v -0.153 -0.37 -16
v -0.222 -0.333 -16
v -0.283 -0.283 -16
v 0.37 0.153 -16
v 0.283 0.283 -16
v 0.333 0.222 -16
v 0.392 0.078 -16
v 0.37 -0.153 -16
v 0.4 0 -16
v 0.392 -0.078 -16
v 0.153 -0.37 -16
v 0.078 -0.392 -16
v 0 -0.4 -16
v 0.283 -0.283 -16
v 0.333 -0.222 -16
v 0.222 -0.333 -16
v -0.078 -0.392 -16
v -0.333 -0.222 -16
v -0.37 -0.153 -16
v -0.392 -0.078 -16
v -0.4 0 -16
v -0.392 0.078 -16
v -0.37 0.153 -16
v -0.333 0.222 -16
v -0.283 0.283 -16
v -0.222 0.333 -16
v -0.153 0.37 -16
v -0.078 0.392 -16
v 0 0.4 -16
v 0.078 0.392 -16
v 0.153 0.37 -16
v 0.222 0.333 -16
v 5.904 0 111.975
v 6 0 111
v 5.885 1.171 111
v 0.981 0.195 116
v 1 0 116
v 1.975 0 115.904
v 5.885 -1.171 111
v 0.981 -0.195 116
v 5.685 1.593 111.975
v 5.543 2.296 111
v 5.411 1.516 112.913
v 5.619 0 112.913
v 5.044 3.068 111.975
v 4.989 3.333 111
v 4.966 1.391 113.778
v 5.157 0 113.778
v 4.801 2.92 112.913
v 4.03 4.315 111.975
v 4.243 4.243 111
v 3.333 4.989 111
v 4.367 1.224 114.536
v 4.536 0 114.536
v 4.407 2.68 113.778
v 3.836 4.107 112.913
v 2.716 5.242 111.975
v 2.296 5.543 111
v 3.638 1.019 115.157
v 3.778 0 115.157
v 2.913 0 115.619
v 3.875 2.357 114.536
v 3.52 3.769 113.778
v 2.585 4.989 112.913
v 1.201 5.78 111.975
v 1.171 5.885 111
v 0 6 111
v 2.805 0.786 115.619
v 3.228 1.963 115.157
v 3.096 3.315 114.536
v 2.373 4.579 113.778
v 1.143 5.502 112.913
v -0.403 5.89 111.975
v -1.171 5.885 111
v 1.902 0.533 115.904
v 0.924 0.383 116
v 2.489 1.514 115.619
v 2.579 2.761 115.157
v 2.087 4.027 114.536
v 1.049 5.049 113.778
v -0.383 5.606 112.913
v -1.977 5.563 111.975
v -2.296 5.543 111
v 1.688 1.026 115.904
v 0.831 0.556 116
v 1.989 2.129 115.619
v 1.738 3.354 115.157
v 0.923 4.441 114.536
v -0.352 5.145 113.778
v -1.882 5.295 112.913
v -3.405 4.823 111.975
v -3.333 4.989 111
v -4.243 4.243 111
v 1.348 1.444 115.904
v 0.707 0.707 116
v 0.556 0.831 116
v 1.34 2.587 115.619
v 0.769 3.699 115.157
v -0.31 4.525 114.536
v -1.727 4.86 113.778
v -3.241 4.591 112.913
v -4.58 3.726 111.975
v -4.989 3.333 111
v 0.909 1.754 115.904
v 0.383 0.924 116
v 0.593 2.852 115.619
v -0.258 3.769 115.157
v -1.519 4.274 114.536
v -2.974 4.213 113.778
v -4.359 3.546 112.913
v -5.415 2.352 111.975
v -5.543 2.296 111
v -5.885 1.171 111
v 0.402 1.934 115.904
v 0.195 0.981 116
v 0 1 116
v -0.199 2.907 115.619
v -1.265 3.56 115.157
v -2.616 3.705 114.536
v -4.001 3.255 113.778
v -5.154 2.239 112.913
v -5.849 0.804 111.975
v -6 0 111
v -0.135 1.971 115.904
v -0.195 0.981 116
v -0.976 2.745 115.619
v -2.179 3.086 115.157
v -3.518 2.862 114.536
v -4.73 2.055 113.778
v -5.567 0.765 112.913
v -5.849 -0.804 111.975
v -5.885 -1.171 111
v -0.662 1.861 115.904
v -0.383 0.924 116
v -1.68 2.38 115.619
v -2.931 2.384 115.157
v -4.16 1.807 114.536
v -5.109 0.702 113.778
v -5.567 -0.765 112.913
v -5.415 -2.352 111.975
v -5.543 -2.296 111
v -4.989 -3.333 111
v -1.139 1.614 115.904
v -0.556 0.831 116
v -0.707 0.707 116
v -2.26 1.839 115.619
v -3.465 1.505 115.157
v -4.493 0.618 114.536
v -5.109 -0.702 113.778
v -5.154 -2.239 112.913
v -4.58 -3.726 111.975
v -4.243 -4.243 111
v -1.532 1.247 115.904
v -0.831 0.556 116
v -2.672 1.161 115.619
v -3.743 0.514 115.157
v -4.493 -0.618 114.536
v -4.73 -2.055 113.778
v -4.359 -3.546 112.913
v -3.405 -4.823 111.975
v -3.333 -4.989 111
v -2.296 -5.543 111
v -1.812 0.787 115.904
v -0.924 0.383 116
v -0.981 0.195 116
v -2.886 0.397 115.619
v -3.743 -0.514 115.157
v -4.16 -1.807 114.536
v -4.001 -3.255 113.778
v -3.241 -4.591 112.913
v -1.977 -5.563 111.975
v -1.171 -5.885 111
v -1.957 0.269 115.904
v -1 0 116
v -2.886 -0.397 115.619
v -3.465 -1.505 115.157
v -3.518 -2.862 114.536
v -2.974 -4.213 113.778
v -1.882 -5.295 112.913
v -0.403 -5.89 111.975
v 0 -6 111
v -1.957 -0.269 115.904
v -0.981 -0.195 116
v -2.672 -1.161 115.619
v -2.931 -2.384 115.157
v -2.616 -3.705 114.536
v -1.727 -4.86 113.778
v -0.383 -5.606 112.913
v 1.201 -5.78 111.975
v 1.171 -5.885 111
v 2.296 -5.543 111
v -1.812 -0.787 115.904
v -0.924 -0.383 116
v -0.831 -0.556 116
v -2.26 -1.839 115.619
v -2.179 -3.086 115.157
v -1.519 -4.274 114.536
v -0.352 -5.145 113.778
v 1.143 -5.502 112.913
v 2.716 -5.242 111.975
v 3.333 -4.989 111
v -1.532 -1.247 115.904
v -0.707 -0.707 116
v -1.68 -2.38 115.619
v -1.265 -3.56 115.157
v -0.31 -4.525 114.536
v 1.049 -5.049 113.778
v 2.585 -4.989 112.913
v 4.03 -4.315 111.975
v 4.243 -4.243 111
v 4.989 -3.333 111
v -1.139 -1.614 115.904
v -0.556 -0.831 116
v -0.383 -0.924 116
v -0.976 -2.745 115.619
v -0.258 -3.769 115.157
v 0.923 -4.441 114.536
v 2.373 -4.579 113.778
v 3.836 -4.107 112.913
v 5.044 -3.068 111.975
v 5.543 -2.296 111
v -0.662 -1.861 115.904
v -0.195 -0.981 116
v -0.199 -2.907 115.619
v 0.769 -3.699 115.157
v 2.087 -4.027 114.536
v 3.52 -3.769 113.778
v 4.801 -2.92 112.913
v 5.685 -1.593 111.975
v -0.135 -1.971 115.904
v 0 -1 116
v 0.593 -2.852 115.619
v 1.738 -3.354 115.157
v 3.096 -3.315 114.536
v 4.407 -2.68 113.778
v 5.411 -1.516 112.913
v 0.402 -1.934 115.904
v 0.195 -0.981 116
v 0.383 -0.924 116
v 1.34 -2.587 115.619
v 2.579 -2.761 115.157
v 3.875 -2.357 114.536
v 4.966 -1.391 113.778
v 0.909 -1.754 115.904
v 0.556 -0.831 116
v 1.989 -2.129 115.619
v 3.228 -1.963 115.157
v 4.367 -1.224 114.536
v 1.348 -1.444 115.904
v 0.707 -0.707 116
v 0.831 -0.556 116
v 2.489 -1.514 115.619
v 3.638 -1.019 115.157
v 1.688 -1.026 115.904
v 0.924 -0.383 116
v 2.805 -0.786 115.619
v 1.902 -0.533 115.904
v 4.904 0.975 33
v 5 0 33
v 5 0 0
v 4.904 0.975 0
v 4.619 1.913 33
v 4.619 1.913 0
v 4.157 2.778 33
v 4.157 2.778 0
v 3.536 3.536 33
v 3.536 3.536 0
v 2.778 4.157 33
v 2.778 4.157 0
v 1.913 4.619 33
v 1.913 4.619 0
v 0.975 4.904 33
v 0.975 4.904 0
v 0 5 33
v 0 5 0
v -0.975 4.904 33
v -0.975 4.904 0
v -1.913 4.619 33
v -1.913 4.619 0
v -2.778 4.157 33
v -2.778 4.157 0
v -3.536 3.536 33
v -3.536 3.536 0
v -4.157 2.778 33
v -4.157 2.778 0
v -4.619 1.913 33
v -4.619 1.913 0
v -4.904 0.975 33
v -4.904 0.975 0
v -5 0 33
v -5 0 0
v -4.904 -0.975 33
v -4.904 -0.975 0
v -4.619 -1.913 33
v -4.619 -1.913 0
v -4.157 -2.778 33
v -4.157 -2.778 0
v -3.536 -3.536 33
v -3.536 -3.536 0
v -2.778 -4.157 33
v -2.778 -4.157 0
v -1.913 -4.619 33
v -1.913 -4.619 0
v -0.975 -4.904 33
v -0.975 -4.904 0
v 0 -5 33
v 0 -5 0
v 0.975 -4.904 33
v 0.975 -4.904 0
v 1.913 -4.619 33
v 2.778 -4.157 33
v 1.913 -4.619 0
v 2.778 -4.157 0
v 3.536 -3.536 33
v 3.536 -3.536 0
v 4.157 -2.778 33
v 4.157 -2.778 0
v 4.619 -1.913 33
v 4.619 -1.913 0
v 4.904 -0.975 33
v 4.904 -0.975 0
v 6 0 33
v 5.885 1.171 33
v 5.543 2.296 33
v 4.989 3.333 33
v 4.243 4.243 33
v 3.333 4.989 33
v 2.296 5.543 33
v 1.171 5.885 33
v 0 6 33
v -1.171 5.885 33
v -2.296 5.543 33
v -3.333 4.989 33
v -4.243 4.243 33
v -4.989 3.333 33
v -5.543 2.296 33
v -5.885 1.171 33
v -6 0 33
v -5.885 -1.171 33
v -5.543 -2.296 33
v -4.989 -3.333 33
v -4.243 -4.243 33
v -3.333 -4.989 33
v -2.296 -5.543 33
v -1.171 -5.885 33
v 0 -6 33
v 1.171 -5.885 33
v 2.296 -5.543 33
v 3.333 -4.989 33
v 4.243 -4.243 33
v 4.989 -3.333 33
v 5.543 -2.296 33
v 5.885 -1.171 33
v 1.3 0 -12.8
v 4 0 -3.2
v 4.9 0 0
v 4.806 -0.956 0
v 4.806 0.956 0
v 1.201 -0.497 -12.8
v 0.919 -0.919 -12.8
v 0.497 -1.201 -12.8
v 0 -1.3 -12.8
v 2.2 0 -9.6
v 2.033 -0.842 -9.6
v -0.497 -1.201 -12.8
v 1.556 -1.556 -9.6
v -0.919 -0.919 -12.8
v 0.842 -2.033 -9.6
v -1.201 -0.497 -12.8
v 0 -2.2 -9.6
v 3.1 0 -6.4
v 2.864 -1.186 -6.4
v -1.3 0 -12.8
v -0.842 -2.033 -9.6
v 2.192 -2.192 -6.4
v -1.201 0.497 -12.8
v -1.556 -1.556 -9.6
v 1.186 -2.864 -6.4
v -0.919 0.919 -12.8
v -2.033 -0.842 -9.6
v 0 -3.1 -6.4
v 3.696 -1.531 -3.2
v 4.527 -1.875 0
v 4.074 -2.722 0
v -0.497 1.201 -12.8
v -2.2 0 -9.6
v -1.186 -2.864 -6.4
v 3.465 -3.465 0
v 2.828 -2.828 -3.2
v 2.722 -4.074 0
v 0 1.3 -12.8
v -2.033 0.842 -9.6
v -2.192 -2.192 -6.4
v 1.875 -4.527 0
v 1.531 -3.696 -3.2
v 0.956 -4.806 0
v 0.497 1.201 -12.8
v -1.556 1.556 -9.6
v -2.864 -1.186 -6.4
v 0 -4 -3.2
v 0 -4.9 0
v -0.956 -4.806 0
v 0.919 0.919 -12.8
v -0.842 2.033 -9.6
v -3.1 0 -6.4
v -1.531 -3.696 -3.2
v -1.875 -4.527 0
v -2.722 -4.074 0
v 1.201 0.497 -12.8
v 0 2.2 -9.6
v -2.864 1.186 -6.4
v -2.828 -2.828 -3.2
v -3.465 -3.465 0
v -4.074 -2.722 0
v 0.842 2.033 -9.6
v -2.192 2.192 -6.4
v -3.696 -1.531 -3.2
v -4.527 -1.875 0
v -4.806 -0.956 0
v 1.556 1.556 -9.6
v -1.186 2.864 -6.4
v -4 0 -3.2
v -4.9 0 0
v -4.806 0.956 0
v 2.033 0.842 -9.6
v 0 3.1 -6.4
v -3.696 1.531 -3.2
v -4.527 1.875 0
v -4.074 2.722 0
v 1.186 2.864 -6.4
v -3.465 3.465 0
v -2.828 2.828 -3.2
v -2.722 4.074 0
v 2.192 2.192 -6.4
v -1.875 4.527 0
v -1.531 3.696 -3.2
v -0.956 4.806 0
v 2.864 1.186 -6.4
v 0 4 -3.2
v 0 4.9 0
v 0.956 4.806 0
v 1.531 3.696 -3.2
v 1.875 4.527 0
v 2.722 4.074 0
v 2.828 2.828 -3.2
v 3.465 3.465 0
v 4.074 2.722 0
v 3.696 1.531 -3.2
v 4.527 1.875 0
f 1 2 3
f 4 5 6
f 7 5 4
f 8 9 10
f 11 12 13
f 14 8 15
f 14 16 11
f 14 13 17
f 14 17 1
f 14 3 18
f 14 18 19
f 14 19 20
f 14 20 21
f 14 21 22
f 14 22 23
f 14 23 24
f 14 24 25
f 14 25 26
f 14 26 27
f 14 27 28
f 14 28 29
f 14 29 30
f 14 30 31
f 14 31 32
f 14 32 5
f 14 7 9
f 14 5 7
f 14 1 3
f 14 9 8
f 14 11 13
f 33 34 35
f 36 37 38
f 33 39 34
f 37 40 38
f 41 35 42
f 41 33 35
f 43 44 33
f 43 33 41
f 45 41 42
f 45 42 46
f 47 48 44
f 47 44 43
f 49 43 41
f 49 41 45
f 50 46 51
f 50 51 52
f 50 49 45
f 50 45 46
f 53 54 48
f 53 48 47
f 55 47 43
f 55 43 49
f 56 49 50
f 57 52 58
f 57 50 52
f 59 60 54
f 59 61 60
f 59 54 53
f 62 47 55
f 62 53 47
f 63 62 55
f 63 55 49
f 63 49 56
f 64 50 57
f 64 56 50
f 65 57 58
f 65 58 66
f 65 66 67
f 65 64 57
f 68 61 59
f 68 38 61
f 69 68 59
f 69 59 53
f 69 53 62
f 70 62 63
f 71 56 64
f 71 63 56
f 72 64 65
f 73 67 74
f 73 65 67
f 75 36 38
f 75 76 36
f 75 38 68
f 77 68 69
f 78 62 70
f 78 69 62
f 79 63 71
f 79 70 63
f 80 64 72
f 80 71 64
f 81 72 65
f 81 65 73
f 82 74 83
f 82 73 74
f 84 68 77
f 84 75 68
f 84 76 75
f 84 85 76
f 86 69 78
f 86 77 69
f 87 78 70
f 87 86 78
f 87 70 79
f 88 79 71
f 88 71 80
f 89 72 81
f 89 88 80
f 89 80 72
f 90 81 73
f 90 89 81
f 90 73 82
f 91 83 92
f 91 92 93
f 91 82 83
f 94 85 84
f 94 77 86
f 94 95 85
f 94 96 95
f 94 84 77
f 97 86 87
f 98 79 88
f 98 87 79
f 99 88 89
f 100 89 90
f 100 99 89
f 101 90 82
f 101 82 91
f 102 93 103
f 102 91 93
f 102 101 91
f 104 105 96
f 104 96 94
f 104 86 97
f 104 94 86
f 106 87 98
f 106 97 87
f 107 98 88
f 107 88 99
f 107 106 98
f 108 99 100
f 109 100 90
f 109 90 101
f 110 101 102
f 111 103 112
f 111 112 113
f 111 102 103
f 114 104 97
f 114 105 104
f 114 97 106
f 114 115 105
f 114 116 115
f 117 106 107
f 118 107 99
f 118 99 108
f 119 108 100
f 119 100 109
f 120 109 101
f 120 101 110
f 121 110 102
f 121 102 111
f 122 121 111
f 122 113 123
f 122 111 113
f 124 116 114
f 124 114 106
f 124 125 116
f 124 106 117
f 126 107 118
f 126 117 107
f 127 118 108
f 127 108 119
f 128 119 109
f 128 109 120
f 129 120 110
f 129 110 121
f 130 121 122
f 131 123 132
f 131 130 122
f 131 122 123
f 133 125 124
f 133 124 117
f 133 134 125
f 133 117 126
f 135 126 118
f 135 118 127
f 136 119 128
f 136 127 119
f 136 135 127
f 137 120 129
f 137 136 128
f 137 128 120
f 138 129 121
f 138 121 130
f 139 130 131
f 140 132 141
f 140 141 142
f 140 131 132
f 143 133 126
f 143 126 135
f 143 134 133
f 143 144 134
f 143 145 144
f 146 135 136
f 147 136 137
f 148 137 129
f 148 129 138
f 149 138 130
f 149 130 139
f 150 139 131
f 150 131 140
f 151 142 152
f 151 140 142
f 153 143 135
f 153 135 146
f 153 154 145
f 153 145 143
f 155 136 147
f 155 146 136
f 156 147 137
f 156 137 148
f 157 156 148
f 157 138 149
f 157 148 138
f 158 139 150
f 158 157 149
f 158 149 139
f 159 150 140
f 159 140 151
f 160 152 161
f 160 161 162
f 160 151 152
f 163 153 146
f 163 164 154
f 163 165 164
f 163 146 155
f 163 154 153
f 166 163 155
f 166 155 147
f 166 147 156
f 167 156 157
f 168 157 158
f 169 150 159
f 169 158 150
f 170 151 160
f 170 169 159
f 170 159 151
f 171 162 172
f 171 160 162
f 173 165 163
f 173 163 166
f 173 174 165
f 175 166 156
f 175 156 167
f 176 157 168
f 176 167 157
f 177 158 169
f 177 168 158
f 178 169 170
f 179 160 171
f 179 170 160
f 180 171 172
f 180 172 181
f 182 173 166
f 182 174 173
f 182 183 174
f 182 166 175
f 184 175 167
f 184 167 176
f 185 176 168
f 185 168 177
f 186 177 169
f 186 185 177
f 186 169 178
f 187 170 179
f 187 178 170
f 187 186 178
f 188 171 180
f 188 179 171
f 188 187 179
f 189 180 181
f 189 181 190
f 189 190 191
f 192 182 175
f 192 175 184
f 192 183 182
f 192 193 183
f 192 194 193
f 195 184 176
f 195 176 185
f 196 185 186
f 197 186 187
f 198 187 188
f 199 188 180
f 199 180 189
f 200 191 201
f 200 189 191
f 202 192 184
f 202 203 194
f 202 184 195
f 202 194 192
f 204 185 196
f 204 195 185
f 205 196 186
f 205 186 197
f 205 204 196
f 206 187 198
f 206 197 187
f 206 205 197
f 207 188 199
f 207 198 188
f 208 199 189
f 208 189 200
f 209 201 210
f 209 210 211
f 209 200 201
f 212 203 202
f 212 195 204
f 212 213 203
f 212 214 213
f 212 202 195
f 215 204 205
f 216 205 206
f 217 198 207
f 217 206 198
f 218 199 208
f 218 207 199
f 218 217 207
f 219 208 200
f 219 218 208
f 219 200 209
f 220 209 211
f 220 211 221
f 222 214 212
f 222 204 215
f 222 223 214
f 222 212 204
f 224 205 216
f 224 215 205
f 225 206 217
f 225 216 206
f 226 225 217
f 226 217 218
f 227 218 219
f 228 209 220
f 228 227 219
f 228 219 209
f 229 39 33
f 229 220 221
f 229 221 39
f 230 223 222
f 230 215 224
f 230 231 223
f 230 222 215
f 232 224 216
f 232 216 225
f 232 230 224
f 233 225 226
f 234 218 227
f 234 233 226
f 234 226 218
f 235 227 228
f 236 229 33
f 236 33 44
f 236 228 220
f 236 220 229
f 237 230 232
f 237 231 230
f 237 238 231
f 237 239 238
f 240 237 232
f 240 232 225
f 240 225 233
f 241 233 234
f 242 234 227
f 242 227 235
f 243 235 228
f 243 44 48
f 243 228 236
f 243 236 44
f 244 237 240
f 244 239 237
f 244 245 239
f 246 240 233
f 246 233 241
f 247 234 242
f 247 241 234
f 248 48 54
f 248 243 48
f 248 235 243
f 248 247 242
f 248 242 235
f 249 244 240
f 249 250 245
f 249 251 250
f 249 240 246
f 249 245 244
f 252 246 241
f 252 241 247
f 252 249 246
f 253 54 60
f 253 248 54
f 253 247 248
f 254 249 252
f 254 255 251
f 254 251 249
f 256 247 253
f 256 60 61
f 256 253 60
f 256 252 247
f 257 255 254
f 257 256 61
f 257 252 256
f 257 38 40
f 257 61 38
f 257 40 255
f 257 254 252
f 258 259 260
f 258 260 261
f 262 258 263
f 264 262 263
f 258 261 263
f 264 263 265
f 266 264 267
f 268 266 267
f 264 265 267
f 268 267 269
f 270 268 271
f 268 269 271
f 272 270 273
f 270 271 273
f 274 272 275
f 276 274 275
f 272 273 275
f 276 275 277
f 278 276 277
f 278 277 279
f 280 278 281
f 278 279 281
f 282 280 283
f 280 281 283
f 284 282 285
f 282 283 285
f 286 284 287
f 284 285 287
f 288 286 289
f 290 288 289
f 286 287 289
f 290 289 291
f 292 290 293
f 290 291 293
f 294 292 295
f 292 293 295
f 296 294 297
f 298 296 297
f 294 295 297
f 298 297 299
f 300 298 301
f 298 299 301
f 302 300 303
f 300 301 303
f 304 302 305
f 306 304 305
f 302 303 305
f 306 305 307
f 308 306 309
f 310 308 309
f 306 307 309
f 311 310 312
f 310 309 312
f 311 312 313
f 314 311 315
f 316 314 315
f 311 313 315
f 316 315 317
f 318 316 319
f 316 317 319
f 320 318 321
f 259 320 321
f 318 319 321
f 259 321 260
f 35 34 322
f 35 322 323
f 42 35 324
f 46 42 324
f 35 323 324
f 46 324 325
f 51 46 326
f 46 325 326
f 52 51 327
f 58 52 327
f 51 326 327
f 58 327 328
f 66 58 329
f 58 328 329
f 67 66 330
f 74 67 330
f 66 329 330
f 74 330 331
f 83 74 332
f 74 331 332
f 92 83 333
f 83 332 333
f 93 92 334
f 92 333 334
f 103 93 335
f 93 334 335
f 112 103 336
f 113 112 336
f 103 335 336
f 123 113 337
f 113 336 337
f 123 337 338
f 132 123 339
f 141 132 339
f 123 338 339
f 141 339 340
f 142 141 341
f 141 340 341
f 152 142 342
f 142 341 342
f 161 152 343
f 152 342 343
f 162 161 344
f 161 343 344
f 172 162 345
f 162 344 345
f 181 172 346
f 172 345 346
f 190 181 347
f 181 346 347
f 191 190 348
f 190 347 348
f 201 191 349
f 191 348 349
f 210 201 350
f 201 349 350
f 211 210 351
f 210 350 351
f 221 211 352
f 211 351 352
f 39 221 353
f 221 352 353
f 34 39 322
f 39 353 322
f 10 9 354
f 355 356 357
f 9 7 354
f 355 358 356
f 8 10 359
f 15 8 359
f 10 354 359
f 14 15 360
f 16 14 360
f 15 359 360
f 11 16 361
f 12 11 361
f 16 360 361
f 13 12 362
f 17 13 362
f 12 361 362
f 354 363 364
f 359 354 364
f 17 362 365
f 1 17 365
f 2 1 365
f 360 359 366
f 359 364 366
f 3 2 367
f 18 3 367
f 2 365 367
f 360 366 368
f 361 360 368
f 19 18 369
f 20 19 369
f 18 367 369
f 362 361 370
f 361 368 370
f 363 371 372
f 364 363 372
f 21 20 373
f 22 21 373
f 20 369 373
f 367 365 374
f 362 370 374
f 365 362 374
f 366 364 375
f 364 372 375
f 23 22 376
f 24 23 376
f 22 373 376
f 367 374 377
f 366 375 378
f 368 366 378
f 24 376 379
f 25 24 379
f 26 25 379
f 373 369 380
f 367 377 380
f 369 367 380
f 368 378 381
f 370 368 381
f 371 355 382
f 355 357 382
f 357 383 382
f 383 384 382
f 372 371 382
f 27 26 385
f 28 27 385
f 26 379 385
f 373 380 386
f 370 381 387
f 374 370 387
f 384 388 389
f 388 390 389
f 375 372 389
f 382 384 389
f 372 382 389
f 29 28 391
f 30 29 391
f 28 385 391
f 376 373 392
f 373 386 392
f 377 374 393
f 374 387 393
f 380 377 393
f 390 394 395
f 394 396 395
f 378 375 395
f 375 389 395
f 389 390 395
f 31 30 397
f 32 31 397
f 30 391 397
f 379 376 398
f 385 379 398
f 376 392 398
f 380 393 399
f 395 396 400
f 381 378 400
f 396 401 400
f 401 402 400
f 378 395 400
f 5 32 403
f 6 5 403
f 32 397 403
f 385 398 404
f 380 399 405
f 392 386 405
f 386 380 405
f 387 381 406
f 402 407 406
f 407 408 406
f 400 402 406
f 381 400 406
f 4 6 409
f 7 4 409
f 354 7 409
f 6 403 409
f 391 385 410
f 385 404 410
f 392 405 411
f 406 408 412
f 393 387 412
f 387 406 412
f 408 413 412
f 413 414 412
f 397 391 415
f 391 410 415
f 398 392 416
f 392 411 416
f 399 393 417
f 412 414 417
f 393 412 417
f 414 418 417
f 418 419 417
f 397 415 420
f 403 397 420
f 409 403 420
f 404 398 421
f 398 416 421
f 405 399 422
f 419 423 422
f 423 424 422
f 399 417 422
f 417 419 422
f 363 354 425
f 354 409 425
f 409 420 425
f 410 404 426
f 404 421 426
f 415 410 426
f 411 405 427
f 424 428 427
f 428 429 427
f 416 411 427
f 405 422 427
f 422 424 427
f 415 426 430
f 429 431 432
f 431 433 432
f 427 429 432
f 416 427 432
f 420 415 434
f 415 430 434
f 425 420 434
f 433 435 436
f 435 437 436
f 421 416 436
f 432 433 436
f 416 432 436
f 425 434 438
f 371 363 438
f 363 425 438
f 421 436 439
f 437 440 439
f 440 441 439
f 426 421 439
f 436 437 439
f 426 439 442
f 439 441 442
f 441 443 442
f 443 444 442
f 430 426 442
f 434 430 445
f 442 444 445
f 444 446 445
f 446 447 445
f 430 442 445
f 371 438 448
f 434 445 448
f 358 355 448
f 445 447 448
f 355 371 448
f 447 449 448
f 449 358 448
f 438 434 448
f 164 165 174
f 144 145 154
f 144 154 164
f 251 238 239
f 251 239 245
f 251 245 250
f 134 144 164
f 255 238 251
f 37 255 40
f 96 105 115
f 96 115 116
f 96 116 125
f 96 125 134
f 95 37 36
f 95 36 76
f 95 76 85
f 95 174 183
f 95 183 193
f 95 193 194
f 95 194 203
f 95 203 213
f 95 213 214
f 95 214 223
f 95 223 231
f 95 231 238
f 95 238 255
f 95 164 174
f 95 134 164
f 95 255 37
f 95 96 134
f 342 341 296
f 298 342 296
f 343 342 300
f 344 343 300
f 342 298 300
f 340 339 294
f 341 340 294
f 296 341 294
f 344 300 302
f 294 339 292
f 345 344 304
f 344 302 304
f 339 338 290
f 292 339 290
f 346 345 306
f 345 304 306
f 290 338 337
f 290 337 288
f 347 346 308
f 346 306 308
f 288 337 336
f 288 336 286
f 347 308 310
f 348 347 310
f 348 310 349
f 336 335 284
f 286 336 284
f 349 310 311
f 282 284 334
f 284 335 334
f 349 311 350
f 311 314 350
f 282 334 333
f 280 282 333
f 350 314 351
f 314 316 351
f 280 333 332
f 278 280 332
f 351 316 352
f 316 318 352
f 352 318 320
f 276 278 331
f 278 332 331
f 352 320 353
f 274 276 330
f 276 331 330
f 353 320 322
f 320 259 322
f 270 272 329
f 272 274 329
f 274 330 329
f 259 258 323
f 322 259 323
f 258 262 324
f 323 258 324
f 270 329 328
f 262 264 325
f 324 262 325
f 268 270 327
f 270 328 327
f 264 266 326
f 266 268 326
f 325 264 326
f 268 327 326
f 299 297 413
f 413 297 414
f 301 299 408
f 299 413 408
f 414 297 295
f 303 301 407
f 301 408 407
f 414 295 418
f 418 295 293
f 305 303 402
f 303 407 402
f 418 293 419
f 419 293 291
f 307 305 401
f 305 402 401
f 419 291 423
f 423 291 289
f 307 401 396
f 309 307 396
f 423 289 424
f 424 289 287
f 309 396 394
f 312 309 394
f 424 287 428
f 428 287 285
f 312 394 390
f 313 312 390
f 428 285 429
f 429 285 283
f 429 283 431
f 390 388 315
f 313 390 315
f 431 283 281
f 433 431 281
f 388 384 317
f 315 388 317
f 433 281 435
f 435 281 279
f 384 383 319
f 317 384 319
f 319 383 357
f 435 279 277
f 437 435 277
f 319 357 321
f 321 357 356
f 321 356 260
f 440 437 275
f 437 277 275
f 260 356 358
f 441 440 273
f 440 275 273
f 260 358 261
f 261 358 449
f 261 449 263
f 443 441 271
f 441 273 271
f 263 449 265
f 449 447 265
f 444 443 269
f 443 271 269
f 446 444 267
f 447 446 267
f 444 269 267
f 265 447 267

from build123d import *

# Parameters (mm, degrees)
F0_R     = 5
F1_DEPTH = 33
F2_R     = 4.9
F3_DEPTH = 16
F4_SIZE2 = 15.99999
F4_SIZE  = 4.49999
F5_R     = 6
F5_R_2   = 5
F6_DEPTH = 83
F7_R     = 5


# Not quite as in the source:
# - a fillet or chamfer is up to 0.001 mm smaller than in the source, because OpenCascade refuses the exact size


with BuildPart() as f1:
    # F0 (on Top) → F1 (new body)
    with BuildSketch(Plane.XY):
        Circle(F0_R)
    extrude(amount=F1_DEPTH)

    # F2 (on face) → F3 (join)
    with BuildSketch(Plane(origin=(0, 0, 0), x_dir=(1, 0, 0), z_dir=(0, 0, -1))):
        Circle(F2_R)
    extrude(amount=F3_DEPTH)

    # F4 (size 4.5 and 16 in the source; OpenCascade refuses exactly that, so slightly less here)
    f4_edges = [f1.edges().sort_by_distance(p)[0] for p in [
        (-4.9, 0, -16),
    ]]
    f4_side = f1.faces().sort_by_distance((0, 0, -16))[0]
    chamfer(f4_edges, length=F4_SIZE, length2=F4_SIZE2, reference=f4_side)

    # F5 (on face) → F6 (join)
    with BuildSketch(Plane.XY.offset(33)):
        Circle(F5_R)
        Circle(F5_R_2, mode=Mode.SUBTRACT)
        Circle(F5_R_2)
    extrude(amount=F6_DEPTH)

    # F7
    f7_edges = [f1.edges().sort_by_distance(p)[0] for p in [
        (-6, 0, 116),
    ]]
    fillet(f7_edges, radius=F7_R)


solid = f1.part
